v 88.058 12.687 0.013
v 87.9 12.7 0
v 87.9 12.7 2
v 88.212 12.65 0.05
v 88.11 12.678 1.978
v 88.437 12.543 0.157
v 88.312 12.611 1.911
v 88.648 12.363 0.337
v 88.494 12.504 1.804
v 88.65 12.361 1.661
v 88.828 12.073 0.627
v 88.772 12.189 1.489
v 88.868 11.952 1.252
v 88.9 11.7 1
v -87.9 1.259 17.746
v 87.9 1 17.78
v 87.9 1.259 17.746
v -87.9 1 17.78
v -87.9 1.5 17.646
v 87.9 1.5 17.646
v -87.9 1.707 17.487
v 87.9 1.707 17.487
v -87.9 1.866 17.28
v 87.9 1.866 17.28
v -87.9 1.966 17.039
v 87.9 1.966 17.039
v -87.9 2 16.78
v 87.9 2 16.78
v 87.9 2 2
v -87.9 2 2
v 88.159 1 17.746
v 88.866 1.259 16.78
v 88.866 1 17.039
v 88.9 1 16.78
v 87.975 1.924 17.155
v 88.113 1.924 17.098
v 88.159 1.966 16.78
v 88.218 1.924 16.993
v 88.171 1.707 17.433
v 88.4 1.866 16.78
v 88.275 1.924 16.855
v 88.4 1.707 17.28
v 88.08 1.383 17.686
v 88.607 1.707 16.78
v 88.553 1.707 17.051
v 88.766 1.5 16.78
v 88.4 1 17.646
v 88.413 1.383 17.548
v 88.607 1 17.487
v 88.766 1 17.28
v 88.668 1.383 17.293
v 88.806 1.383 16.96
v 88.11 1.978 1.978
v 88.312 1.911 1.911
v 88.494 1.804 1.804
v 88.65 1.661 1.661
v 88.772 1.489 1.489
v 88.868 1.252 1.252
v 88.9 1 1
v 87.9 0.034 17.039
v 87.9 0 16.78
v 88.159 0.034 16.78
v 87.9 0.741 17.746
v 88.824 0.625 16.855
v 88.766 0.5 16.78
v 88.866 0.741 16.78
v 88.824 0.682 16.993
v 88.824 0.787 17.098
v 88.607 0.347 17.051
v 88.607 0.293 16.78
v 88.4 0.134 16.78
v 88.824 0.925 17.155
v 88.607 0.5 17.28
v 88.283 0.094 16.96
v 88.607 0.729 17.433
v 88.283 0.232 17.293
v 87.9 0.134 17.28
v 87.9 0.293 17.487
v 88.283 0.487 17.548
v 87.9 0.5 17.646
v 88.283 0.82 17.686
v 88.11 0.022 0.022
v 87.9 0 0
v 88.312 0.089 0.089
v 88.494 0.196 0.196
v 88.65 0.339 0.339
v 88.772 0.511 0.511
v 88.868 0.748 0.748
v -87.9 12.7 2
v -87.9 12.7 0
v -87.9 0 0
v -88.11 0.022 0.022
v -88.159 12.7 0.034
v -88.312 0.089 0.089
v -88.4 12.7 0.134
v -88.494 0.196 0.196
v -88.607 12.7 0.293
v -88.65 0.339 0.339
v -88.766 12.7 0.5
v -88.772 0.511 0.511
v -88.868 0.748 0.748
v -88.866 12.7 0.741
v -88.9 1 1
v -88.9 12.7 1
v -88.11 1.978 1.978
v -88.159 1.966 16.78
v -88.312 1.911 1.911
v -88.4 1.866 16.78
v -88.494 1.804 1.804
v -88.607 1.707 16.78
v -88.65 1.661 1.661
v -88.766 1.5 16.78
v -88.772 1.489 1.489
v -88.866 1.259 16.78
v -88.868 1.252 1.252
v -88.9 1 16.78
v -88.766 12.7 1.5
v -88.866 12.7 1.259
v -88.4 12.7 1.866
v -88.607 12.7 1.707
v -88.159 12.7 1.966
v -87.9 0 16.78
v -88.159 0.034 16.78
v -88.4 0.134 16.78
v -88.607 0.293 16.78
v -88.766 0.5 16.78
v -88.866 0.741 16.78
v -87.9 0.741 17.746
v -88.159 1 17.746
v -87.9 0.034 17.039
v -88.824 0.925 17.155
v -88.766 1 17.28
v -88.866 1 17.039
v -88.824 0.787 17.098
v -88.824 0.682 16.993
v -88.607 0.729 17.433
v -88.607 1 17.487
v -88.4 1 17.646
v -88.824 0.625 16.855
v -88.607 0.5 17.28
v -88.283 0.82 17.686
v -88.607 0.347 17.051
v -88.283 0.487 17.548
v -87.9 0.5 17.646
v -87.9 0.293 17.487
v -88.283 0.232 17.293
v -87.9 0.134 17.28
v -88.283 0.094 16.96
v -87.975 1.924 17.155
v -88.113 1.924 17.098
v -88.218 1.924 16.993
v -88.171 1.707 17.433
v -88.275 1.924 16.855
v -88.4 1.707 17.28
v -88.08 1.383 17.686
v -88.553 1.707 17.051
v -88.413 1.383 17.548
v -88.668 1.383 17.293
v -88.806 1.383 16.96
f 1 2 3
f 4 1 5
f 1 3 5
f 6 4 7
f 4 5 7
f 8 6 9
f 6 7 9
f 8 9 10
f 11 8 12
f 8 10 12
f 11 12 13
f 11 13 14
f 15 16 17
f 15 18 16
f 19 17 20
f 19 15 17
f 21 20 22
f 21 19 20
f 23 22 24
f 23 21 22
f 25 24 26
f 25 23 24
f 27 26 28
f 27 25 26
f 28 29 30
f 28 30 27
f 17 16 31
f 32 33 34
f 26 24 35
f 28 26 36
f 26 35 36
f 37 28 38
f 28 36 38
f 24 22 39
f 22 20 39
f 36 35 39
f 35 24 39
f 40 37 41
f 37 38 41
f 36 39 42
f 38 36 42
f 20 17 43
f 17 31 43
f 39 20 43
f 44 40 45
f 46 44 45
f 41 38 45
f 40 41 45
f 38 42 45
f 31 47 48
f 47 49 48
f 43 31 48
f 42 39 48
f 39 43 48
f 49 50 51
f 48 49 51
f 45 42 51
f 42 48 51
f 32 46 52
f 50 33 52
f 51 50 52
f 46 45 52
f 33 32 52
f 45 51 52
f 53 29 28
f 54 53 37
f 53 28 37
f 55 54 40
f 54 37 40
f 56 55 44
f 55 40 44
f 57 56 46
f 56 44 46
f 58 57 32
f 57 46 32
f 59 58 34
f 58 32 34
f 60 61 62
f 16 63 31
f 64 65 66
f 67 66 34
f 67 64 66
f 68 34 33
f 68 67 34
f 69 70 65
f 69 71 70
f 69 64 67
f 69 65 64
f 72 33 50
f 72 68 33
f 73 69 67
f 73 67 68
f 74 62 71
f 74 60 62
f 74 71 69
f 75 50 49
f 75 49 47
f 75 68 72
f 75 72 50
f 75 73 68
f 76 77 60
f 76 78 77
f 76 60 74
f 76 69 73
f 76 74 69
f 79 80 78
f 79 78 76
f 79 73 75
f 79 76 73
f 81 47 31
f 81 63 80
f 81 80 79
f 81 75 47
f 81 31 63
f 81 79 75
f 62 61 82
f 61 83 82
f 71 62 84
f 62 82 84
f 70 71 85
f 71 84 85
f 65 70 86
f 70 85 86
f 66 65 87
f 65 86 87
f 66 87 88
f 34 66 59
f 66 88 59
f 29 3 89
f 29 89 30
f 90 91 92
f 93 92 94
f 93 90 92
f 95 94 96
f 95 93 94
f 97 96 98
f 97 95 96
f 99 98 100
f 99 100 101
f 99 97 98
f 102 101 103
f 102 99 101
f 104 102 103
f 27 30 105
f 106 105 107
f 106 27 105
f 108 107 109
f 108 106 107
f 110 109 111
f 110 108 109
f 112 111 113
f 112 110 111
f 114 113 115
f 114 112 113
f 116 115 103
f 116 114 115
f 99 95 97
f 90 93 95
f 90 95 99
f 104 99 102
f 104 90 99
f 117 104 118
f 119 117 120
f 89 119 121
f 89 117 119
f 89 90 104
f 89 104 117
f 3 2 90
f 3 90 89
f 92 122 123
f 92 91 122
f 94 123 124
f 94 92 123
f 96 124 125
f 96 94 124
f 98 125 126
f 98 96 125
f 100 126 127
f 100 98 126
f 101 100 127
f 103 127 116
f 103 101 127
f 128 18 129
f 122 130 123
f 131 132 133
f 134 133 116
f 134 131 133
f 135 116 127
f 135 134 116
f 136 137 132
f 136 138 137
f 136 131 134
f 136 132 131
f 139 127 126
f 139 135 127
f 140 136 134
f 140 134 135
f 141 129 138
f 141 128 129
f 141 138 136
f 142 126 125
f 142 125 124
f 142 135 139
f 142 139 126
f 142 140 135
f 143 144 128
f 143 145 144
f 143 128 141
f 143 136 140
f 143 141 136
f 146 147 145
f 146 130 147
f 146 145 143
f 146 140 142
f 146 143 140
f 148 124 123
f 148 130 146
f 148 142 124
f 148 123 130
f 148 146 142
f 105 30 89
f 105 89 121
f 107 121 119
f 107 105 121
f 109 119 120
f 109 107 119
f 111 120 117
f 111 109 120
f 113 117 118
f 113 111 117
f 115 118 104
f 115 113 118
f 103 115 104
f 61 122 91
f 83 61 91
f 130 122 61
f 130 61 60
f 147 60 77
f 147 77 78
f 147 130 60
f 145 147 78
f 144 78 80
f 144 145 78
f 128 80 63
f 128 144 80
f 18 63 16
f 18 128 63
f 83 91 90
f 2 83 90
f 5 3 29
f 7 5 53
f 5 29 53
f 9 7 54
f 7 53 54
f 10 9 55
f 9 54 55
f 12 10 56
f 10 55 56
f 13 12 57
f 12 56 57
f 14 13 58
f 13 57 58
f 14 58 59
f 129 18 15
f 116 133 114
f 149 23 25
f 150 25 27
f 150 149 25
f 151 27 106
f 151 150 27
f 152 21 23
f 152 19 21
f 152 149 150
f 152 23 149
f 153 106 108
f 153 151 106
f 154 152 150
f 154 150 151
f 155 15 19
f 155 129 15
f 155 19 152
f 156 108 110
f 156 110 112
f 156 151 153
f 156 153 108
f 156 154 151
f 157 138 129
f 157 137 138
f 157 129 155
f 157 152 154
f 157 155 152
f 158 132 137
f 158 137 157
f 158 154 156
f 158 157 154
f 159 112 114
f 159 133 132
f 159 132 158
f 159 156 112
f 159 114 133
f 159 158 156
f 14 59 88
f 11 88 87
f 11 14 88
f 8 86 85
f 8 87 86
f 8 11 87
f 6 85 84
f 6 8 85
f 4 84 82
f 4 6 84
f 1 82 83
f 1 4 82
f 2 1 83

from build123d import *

# Parameters (mm, degrees)
F1_DEPTH = 88.9
F2_R     = 0.99999


# Not quite as in the source:
# - a fillet or chamfer is up to 0.001 mm smaller than in the source, because OpenCascade refuses the exact size


with BuildPart() as f1:
    # F0 (on Right) → F1 (new body, symmetric)
    with BuildSketch(Plane.YZ):
        Polygon((0, 17.78), (0, 0), (12.7, 0), (12.7, 2), (2, 2), (2, 17.78), align=None)
    extrude(amount=F1_DEPTH, both=True)

    # F2 (radius 1 in the source; OpenCascade refuses exactly that, so slightly less here)
    f2_edges = [f1.edges().sort_by_distance(p)[0] for p in [
        (0, 0, 17.78),
        (88.9, 0, 8.89),
        (-88.9, 1, 17.78),
        (88.9, 1, 17.78),
        (0, 2, 17.78),
        (88.9, 2, 9.89),
        (88.9, 6.35, 0),
        (88.9, 12.7, 1),
        (88.9, 7.35, 2),
        (-88.9, 0, 8.89),
        (-88.9, 2, 9.89),
        (-88.9, 7.35, 2),
        (-88.9, 6.35, 0),
    ]]
    fillet(f2_edges, radius=F2_R)


solid = f1.part
